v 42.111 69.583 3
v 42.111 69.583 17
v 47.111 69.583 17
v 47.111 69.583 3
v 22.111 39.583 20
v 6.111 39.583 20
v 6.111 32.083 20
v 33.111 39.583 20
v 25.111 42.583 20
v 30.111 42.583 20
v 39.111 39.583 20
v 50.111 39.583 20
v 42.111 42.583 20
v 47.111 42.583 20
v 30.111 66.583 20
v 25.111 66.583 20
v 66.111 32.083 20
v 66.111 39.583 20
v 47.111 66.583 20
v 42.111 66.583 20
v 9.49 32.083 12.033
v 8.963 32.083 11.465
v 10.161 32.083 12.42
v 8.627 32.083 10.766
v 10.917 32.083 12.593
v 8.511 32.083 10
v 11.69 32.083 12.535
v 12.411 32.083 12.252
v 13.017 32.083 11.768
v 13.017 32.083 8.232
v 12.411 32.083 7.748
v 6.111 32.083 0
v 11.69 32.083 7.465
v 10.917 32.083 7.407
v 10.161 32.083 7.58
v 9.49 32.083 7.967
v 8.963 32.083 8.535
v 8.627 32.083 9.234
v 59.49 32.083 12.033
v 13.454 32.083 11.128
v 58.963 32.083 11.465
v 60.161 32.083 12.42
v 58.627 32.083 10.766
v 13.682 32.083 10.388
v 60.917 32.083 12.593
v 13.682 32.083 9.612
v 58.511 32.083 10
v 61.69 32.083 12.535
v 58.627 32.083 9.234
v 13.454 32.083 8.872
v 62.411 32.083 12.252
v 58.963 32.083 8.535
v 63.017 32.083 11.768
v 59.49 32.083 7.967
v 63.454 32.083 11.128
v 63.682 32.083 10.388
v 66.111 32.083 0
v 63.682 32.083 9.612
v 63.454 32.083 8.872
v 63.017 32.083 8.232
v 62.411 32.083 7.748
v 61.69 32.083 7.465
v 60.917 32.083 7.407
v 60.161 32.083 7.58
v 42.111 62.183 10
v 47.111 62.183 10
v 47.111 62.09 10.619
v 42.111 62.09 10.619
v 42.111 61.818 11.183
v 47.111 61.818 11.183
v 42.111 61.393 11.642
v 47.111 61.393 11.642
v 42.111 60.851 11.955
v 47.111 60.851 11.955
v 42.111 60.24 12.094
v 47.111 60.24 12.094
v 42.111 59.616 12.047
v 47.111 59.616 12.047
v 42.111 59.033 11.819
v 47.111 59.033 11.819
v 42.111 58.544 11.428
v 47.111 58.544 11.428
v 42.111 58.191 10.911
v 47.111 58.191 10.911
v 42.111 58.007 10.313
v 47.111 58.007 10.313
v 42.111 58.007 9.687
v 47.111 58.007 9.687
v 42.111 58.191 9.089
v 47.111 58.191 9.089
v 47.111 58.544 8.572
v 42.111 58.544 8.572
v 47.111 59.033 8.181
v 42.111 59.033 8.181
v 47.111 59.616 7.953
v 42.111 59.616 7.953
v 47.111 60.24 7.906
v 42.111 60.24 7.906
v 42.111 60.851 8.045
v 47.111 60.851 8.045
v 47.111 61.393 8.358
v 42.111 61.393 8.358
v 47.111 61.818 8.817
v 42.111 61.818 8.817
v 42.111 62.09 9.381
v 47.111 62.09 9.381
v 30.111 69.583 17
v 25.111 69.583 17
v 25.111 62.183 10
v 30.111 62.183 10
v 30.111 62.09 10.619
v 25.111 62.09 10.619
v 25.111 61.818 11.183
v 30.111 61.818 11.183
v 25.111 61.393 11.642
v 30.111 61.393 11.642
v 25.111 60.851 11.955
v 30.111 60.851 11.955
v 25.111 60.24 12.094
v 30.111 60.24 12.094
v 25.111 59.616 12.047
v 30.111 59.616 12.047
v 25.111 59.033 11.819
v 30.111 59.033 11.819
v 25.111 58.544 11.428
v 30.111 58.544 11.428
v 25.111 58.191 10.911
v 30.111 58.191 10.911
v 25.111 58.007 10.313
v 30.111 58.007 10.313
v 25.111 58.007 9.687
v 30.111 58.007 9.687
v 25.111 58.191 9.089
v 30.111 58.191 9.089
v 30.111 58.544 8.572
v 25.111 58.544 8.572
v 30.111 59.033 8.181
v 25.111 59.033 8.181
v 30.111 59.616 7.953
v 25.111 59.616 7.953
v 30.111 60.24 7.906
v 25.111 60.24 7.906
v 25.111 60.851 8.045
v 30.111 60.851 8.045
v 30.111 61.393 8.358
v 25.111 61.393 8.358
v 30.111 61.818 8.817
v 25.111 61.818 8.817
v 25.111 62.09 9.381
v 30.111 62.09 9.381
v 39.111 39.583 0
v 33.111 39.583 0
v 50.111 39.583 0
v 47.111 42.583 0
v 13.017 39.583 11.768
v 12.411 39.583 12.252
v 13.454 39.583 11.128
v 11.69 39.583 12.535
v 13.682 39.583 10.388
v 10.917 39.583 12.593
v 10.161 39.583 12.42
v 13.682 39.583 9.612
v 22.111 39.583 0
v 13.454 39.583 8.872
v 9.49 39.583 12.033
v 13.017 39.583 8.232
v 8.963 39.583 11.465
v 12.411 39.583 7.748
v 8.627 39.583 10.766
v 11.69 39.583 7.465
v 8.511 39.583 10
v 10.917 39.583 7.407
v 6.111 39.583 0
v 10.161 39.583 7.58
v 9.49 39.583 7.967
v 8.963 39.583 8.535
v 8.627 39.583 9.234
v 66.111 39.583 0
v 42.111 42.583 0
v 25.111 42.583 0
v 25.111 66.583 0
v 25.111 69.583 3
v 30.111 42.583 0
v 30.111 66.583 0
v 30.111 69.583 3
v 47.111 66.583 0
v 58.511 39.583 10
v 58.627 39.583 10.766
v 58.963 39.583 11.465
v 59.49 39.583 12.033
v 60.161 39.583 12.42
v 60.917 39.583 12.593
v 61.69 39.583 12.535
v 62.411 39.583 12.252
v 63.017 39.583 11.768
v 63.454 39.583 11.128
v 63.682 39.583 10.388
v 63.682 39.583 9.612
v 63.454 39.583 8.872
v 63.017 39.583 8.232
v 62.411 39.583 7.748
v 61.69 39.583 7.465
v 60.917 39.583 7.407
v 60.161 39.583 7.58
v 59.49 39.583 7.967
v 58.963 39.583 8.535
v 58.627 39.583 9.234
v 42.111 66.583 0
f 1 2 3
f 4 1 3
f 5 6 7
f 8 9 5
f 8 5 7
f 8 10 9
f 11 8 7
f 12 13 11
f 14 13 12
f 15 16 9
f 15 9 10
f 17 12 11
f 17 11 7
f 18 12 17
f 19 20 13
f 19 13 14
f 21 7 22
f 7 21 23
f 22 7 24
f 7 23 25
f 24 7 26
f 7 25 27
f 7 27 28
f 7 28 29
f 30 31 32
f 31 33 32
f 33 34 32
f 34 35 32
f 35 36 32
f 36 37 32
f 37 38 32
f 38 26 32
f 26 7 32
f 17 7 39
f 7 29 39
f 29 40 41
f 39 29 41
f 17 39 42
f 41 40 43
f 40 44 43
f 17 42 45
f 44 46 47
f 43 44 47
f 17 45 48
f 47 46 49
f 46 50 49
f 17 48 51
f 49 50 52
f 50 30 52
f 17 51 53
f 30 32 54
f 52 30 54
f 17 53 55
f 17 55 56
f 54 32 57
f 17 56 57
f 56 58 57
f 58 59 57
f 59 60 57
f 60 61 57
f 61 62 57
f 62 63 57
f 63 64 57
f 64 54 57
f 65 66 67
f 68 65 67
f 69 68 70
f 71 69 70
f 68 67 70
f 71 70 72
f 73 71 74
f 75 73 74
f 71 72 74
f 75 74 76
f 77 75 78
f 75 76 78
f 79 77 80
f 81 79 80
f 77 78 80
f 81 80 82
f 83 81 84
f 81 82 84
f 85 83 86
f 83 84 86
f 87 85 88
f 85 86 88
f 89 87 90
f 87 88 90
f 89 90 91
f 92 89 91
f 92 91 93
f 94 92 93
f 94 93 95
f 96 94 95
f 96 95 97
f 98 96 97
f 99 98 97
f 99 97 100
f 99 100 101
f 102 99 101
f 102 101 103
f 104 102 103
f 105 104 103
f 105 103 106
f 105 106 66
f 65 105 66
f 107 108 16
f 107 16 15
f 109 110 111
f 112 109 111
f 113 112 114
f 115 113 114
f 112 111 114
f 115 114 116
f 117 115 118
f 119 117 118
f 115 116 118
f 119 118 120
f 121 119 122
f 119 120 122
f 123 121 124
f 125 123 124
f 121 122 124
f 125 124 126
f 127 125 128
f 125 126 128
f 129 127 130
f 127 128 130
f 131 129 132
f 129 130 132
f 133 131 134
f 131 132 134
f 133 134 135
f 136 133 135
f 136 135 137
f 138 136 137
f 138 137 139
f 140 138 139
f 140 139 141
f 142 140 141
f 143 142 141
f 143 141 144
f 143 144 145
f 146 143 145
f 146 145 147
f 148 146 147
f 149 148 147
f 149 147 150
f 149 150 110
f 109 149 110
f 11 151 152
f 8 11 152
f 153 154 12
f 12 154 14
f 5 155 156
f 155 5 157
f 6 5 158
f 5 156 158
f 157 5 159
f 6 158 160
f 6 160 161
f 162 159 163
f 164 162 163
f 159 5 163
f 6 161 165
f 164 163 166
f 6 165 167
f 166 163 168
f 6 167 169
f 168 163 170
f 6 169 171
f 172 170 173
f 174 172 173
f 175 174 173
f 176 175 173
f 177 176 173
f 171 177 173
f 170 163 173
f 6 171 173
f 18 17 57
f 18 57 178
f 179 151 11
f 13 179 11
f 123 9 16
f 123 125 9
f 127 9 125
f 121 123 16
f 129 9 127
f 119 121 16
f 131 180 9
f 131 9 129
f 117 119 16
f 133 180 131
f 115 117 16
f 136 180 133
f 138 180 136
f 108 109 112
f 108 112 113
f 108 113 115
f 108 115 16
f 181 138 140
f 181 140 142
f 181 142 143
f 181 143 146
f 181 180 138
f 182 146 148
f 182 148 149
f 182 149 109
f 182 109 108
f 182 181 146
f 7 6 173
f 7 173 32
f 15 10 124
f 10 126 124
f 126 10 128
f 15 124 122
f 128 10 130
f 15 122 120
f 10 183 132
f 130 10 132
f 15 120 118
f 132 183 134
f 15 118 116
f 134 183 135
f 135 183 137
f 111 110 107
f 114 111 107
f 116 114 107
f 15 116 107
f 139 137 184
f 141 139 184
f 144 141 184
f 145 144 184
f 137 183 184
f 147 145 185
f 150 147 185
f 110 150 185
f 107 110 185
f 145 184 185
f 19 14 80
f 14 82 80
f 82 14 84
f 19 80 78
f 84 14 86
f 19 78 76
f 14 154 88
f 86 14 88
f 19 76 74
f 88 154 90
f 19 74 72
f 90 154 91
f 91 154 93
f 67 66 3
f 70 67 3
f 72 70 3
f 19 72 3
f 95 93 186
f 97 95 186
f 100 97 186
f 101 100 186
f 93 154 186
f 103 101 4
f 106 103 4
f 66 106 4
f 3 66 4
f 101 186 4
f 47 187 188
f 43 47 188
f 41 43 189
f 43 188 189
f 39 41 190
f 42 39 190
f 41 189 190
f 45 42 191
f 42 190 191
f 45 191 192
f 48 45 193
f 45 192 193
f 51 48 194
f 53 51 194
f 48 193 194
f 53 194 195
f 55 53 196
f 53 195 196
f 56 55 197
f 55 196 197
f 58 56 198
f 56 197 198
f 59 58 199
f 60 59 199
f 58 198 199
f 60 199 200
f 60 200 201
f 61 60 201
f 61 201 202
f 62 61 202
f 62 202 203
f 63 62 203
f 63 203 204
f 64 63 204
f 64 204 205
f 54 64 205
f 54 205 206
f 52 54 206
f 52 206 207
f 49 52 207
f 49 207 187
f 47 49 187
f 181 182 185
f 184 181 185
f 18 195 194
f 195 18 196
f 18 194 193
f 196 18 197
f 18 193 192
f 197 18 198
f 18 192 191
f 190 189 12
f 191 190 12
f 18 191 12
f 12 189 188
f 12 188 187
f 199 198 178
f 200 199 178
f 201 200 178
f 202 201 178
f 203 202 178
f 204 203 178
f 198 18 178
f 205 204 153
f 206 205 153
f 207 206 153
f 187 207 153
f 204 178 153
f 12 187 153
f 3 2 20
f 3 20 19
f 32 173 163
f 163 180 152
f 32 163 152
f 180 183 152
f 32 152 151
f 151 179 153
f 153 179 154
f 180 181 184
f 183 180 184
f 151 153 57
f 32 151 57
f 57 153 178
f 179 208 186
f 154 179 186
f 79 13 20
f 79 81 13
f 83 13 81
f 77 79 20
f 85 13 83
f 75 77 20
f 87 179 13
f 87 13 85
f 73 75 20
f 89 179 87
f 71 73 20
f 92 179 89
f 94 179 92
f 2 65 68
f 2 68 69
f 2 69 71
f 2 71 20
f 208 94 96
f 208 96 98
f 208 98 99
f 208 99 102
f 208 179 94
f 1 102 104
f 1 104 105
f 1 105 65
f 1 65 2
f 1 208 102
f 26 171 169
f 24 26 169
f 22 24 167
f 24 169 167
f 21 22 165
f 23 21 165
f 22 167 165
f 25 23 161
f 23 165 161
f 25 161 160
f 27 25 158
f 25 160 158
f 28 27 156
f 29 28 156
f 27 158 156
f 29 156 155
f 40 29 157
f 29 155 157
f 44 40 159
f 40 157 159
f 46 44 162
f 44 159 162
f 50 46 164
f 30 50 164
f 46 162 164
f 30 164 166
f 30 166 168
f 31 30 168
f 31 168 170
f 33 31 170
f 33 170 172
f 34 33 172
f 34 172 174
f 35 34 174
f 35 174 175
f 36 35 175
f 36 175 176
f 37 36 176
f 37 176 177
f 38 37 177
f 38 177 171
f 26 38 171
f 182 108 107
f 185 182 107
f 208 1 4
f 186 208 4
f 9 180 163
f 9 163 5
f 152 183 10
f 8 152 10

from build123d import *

# Parameters (mm, degrees)
F0_W     = 5
F0_H     = 30
F1_DEPTH = 20
F3_D     = 5.2
F5_D     = 4.2
F6_SIZE  = 3


with BuildPart() as f1:
    # F0 (on Top) → F1 (new body)
    with BuildSketch(Plane.XY):
        Polygon((6.111111, 39.583333), (6.111111, 32.083333), (66.111111, 32.083333), (66.111111, 39.583333), (47.111111, 39.583333), (42.111111, 39.583333), (30.111111, 39.583333), (25.111111, 39.583333), align=None)
        with Locations((27.611111, 54.583333)):
            Rectangle(F0_W, F0_H)
        with Locations((44.611111, 54.583333)):
            Rectangle(F0_W, F0_H)
    extrude(amount=F1_DEPTH)

    # F3 (through all)
    with Locations(Plane.XZ.offset(-32.083333)):
        with Locations((11.111111, 10), (61.111111, 10)):
            Hole(F3_D / 2)

    # F5 (through all)
    with Locations(Plane(origin=(25.111111, 0, 0), x_dir=(0, -1, 0), z_dir=(-1, 0, 0))):
        with Locations((-60.083333, 10)):
            Hole(F5_D / 2)

    # F6
    f6_edges = [f1.edges().sort_by_distance(p)[0] for p in [
        (27.611111, 69.583333, 20),
        (44.611111, 69.583333, 20),
        (44.611111, 69.583333, 0),
        (27.611111, 69.583333, 0),
        (25.111111, 39.583333, 10),
        (47.111111, 39.583333, 10),
        (42.111111, 39.583333, 10),
        (30.111111, 39.583333, 10),
    ]]
    chamfer(f6_edges, length=F6_SIZE)


solid = f1.part
